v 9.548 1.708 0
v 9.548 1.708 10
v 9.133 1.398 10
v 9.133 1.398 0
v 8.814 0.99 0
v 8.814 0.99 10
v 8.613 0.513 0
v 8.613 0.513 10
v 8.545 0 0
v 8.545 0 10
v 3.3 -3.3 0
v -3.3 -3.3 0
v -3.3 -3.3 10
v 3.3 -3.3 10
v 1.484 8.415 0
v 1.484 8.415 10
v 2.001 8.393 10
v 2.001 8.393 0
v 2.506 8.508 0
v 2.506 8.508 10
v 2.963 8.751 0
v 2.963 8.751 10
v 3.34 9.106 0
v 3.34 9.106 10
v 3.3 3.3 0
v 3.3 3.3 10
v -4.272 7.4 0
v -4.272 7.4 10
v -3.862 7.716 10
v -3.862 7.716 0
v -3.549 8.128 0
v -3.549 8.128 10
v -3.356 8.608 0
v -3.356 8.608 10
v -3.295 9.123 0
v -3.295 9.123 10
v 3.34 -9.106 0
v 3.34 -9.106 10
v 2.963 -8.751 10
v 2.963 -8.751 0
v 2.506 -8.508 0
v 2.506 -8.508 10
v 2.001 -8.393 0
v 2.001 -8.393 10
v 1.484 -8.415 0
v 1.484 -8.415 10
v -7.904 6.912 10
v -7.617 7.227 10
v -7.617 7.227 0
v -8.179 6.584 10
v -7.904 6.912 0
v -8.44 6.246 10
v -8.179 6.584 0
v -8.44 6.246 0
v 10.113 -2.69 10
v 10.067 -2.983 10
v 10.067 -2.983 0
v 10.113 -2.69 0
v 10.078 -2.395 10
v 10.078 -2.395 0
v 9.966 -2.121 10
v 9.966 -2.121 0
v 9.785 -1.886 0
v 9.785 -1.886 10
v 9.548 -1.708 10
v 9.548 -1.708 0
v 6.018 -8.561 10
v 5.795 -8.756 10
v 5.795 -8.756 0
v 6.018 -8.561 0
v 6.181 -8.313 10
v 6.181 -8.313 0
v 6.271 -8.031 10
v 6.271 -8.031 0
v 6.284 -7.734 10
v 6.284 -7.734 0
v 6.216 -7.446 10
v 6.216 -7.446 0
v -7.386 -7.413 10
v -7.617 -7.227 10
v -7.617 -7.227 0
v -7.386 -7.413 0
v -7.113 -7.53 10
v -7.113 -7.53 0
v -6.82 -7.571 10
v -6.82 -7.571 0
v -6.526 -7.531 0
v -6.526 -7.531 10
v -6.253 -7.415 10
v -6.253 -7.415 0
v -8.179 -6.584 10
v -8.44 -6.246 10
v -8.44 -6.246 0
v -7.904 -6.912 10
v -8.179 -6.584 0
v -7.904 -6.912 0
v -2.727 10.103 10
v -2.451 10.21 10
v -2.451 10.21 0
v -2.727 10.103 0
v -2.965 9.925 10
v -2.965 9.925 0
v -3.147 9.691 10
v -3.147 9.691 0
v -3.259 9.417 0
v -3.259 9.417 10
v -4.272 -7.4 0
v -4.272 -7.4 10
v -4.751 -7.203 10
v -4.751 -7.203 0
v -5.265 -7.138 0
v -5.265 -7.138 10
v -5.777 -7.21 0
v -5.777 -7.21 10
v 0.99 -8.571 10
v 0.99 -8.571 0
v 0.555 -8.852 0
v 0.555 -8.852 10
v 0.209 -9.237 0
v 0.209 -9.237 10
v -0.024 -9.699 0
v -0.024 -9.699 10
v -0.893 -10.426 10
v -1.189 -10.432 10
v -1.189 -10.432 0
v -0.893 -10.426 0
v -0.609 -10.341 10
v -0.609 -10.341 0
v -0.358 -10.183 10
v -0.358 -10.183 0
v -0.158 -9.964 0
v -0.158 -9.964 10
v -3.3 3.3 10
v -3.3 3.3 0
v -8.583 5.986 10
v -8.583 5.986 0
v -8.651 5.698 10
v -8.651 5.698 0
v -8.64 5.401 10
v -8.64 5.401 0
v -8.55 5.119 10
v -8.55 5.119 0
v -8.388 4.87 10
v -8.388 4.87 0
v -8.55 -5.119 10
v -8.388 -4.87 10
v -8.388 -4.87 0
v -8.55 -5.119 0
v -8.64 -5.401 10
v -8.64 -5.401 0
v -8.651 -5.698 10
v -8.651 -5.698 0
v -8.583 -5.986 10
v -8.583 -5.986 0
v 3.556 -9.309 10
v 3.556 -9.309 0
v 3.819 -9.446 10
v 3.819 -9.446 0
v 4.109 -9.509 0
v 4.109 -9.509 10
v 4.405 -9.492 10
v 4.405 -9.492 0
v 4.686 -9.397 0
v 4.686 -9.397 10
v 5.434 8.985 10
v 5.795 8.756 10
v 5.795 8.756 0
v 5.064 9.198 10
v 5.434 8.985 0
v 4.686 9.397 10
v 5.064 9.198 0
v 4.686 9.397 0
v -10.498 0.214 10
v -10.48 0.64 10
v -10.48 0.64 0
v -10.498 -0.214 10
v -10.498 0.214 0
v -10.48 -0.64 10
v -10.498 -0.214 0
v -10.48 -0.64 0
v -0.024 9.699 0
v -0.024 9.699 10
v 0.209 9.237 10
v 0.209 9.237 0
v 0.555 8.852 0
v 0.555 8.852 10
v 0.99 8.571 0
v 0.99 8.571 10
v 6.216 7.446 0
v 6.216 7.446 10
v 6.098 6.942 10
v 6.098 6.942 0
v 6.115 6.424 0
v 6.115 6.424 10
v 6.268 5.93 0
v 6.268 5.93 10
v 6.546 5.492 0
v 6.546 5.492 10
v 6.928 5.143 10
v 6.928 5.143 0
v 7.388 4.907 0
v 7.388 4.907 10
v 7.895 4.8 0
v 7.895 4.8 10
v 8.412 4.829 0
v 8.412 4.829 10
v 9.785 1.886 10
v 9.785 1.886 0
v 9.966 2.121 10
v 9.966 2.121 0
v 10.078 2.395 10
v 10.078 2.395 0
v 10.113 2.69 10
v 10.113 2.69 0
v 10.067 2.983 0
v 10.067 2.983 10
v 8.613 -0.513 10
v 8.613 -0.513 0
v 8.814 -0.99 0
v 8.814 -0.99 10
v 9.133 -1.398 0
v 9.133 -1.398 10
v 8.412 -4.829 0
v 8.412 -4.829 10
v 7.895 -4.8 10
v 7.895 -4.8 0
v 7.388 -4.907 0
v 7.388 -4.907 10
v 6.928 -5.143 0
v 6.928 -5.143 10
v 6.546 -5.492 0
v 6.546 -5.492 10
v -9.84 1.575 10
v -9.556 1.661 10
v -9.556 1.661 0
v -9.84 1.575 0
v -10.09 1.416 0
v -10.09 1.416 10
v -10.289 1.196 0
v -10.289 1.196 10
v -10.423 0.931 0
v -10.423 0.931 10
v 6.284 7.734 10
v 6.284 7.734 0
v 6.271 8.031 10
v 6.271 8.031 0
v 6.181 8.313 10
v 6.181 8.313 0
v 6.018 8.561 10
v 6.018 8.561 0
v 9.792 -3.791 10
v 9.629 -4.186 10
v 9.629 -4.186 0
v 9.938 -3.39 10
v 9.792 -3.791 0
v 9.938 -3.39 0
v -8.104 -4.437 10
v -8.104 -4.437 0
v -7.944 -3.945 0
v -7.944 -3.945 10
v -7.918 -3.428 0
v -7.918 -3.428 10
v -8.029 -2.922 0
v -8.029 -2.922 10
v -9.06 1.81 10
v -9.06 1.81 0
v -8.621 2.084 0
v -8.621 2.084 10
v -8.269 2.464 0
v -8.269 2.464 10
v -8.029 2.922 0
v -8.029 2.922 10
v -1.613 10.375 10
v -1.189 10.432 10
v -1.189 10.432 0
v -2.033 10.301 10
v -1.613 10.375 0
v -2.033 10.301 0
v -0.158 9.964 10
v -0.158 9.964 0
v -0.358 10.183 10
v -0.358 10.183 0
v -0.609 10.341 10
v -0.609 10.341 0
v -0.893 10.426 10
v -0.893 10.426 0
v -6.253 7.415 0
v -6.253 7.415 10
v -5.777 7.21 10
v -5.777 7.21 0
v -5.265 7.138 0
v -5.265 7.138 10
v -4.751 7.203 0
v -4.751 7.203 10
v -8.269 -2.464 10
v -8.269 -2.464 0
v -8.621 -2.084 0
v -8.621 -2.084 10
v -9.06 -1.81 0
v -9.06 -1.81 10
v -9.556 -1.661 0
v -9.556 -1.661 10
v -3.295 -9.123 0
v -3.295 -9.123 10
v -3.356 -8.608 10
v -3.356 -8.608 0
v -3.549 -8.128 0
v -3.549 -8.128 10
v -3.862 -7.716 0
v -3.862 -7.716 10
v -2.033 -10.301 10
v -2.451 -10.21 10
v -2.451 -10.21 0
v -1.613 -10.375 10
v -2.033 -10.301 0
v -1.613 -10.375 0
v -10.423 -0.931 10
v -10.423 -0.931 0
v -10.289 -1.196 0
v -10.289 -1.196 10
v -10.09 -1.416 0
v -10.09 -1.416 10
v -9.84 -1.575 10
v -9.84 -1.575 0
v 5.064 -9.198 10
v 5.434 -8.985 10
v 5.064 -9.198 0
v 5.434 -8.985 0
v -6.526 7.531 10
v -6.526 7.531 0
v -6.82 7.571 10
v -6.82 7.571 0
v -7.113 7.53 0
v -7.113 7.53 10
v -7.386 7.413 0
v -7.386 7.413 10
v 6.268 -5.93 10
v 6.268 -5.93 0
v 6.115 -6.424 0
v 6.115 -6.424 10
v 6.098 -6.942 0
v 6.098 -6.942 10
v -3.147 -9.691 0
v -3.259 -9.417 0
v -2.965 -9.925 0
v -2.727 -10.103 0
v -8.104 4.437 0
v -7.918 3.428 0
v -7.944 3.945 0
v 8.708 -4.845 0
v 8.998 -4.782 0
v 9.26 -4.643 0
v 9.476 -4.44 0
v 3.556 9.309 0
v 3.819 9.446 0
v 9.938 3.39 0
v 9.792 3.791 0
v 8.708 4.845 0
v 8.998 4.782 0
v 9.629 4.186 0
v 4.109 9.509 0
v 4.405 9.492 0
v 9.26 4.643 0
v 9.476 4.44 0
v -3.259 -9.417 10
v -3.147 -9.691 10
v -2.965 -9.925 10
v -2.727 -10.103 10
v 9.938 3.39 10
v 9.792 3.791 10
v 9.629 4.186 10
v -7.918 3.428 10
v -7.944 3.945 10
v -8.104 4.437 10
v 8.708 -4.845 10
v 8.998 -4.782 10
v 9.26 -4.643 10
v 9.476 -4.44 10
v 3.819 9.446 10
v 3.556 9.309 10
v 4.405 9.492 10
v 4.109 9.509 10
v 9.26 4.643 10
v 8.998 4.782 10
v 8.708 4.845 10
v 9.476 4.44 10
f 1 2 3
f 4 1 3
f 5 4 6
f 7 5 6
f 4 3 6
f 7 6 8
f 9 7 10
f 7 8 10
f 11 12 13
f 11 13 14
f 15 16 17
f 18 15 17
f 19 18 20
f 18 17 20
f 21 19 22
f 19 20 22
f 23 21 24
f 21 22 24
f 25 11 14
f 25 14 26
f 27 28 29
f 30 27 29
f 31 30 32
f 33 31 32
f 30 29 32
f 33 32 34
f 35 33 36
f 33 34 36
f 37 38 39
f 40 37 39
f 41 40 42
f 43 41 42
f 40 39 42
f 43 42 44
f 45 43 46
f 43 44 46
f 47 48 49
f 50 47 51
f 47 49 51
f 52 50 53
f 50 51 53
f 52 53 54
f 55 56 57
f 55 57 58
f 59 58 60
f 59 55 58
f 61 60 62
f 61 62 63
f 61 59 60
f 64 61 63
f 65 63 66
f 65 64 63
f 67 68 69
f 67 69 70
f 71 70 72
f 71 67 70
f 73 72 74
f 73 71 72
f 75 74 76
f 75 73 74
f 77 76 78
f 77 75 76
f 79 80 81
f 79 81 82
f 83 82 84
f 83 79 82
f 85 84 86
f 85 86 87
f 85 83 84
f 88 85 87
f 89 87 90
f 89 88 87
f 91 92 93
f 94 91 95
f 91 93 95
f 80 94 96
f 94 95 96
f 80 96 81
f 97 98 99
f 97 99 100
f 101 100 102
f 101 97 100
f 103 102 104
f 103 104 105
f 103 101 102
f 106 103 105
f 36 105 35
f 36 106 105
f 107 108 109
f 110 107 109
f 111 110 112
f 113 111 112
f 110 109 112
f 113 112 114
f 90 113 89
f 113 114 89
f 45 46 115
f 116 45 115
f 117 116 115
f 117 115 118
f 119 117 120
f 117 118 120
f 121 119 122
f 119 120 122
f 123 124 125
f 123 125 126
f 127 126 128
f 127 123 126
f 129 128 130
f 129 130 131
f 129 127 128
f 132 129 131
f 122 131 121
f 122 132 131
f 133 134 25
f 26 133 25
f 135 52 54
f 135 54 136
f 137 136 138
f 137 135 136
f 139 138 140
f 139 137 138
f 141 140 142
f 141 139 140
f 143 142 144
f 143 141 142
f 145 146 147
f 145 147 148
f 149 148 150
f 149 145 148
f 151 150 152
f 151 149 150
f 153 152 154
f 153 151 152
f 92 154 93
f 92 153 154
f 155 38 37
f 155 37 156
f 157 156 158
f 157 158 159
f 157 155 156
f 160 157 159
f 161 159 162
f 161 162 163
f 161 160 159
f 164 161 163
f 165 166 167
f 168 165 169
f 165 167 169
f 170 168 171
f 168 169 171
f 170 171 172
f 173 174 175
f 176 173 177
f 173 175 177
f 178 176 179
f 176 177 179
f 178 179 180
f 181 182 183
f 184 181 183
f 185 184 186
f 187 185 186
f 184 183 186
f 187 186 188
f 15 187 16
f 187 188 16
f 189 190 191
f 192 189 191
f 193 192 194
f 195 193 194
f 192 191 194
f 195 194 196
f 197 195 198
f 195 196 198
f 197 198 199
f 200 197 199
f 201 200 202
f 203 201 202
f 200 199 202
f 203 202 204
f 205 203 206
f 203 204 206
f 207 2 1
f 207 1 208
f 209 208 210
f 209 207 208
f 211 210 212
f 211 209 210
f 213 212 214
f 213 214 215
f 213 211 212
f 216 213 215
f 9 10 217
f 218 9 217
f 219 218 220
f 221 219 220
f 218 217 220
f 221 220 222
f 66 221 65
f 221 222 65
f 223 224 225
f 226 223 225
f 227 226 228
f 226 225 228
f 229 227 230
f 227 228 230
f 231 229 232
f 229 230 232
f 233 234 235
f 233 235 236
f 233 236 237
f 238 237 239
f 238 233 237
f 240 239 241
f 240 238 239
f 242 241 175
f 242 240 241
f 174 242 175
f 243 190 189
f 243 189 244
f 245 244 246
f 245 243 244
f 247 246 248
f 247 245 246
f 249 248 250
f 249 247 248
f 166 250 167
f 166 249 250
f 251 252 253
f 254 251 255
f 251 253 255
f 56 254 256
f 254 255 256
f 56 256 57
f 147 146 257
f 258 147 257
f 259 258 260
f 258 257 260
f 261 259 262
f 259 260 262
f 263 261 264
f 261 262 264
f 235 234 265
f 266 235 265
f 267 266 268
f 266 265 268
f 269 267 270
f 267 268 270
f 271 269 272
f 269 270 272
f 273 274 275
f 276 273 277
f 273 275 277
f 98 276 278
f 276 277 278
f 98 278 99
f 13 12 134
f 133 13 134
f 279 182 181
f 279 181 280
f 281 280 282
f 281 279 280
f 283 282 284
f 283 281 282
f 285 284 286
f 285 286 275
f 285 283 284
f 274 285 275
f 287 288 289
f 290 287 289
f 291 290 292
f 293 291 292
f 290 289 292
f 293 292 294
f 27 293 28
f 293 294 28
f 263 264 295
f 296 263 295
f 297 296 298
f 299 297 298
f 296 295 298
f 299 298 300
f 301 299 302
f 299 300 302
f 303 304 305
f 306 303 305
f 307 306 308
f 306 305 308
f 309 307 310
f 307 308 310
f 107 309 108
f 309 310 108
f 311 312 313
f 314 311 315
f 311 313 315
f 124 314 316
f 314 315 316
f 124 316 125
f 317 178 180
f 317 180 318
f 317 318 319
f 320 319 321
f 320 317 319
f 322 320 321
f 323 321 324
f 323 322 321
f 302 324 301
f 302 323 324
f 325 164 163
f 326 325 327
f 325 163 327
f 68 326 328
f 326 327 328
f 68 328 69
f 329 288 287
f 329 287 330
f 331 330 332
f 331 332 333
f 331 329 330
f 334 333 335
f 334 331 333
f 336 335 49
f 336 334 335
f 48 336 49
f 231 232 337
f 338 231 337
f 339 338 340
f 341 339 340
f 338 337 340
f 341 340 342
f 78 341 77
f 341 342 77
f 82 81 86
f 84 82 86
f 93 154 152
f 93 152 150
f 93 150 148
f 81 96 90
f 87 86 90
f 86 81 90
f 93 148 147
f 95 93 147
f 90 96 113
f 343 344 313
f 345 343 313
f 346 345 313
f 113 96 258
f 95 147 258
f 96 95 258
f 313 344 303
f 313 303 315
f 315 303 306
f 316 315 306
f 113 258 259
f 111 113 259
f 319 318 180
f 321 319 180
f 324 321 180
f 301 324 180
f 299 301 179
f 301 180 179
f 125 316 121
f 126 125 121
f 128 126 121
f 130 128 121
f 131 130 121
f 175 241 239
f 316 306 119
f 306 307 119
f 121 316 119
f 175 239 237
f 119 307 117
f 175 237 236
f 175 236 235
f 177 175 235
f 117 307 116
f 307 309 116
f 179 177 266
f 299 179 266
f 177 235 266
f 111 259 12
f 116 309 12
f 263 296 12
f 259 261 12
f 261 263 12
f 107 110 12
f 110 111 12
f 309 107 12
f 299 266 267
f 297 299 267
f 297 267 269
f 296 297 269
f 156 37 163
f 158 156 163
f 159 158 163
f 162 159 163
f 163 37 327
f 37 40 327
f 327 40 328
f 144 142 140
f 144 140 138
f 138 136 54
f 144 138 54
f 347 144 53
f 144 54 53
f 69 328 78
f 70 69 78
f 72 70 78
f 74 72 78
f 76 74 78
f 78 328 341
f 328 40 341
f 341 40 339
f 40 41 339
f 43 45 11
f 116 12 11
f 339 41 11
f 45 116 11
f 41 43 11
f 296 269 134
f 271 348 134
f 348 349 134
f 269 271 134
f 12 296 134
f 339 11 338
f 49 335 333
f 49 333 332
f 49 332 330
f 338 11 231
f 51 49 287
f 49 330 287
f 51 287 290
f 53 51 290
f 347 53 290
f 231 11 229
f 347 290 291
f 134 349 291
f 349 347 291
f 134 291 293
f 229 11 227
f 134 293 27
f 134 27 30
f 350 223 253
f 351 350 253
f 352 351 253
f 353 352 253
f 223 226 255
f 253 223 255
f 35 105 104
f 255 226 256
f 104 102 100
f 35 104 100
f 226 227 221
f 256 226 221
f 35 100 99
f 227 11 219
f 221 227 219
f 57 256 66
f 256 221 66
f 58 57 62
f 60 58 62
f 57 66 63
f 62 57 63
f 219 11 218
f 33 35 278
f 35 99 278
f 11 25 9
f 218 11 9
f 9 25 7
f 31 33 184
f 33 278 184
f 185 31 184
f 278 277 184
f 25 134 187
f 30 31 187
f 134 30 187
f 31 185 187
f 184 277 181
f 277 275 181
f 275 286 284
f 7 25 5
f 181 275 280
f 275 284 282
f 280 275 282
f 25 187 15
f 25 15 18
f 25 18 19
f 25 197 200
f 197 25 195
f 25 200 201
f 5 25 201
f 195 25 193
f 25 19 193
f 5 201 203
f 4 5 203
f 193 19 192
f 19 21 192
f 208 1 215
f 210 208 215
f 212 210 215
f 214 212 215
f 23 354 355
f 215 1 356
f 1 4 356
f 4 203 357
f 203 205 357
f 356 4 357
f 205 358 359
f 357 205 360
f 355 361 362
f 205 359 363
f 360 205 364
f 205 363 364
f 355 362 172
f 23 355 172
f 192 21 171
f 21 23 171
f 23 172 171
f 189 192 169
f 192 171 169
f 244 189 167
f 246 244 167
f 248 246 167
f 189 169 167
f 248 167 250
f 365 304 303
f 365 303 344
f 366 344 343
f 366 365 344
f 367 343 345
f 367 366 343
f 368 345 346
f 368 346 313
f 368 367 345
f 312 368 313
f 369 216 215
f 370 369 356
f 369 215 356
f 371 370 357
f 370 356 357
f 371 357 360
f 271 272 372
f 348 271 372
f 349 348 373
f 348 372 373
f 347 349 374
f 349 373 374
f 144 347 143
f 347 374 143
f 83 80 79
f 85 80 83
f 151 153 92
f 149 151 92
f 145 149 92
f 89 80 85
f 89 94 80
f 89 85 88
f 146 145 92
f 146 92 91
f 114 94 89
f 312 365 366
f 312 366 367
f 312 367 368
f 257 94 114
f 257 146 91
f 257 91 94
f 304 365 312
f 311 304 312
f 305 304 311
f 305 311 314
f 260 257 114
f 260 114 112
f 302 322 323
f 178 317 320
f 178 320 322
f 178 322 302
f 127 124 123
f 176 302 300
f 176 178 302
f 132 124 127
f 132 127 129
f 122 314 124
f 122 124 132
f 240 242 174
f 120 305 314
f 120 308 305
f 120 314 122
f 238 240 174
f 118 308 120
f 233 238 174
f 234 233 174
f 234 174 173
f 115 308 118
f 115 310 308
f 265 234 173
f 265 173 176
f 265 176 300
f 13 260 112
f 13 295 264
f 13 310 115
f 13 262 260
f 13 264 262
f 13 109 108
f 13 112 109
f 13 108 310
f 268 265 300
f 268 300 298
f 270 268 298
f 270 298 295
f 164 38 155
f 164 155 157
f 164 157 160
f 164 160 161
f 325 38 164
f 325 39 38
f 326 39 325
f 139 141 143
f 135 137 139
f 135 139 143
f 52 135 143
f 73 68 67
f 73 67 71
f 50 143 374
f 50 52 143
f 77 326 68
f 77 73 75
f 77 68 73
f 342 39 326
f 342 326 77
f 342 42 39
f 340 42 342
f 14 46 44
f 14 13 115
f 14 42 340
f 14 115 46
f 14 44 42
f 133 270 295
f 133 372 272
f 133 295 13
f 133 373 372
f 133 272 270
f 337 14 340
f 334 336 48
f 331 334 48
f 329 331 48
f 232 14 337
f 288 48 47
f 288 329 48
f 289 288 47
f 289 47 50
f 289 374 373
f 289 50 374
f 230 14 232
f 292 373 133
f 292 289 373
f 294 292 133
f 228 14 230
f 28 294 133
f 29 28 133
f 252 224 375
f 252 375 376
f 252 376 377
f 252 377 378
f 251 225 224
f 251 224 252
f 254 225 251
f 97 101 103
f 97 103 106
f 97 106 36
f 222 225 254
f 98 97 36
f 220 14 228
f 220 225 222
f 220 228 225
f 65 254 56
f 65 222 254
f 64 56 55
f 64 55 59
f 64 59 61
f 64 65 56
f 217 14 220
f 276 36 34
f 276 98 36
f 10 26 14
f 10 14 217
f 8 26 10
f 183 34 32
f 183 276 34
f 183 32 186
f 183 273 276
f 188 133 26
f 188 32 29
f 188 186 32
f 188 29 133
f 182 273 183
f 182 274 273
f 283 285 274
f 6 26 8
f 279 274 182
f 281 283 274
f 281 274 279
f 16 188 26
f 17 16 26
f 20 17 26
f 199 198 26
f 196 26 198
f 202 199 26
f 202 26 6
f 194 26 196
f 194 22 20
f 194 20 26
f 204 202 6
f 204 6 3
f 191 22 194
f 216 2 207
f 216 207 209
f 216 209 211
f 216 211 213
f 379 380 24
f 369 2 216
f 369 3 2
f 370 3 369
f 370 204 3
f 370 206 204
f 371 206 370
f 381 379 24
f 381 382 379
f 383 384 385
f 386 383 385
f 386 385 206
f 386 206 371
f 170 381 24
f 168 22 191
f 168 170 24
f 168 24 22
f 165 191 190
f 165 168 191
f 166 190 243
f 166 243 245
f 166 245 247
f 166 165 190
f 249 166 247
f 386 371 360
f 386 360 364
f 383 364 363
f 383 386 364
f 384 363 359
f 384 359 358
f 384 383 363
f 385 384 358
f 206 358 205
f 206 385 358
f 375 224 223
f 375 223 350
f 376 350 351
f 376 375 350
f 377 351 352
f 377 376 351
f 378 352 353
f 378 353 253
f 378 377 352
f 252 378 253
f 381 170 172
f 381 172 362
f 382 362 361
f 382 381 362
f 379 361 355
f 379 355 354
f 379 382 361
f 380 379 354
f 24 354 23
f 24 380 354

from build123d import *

# Parameters (mm, degrees)
SKETCH_R           = 10.5
SKETCH_W           = 6.6
SKETCH_H           = 6.6
PAD_DEPTH          = 10
POCKET001_DEPTH    = 72.674758
POLARPATTERN_COUNT = 9


with BuildPart() as part:
    # Sketch → Pad (new body)
    with BuildSketch(Plane.XY):
        Circle(SKETCH_R)
        Rectangle(SKETCH_W, SKETCH_H, mode=Mode.SUBTRACT)
    extrude(amount=PAD_DEPTH)

    # Sketch002 → Pocket001 (cut, through all)
    with BuildSketch(Plane.XY.offset(10)):
        with BuildLine():
            ThreePointArc((10.067451, -2.982687), (13.513887, -1e-06), (10.067452, 2.982686))
            ThreePointArc((9.547792, 1.707898), (10.03134, 2.254095), (10.067452, 2.982686))
            ThreePointArc((9.547792, 1.707898), (8.813944, 0.990369), (8.544593, 0))
            ThreePointArc((8.544593, 0), (8.813944, -0.990369), (9.547792, -1.707898))
            ThreePointArc((10.067451, -2.982687), (10.03134, -2.254096), (9.547792, -1.707898))
        make_face()
    pocket001 = extrude(amount=-POCKET001_DEPTH, mode=Mode.SUBTRACT)

    # PolarPattern: Pocket001 ×9 about axis
    polarpattern_axis = Axis((0, 0, 10), (0, 0, 1))
    for i in range(1, POLARPATTERN_COUNT):
        add(pocket001.rotate(polarpattern_axis, i * 360 / POLARPATTERN_COUNT), mode=Mode.SUBTRACT)


solid = part.part
